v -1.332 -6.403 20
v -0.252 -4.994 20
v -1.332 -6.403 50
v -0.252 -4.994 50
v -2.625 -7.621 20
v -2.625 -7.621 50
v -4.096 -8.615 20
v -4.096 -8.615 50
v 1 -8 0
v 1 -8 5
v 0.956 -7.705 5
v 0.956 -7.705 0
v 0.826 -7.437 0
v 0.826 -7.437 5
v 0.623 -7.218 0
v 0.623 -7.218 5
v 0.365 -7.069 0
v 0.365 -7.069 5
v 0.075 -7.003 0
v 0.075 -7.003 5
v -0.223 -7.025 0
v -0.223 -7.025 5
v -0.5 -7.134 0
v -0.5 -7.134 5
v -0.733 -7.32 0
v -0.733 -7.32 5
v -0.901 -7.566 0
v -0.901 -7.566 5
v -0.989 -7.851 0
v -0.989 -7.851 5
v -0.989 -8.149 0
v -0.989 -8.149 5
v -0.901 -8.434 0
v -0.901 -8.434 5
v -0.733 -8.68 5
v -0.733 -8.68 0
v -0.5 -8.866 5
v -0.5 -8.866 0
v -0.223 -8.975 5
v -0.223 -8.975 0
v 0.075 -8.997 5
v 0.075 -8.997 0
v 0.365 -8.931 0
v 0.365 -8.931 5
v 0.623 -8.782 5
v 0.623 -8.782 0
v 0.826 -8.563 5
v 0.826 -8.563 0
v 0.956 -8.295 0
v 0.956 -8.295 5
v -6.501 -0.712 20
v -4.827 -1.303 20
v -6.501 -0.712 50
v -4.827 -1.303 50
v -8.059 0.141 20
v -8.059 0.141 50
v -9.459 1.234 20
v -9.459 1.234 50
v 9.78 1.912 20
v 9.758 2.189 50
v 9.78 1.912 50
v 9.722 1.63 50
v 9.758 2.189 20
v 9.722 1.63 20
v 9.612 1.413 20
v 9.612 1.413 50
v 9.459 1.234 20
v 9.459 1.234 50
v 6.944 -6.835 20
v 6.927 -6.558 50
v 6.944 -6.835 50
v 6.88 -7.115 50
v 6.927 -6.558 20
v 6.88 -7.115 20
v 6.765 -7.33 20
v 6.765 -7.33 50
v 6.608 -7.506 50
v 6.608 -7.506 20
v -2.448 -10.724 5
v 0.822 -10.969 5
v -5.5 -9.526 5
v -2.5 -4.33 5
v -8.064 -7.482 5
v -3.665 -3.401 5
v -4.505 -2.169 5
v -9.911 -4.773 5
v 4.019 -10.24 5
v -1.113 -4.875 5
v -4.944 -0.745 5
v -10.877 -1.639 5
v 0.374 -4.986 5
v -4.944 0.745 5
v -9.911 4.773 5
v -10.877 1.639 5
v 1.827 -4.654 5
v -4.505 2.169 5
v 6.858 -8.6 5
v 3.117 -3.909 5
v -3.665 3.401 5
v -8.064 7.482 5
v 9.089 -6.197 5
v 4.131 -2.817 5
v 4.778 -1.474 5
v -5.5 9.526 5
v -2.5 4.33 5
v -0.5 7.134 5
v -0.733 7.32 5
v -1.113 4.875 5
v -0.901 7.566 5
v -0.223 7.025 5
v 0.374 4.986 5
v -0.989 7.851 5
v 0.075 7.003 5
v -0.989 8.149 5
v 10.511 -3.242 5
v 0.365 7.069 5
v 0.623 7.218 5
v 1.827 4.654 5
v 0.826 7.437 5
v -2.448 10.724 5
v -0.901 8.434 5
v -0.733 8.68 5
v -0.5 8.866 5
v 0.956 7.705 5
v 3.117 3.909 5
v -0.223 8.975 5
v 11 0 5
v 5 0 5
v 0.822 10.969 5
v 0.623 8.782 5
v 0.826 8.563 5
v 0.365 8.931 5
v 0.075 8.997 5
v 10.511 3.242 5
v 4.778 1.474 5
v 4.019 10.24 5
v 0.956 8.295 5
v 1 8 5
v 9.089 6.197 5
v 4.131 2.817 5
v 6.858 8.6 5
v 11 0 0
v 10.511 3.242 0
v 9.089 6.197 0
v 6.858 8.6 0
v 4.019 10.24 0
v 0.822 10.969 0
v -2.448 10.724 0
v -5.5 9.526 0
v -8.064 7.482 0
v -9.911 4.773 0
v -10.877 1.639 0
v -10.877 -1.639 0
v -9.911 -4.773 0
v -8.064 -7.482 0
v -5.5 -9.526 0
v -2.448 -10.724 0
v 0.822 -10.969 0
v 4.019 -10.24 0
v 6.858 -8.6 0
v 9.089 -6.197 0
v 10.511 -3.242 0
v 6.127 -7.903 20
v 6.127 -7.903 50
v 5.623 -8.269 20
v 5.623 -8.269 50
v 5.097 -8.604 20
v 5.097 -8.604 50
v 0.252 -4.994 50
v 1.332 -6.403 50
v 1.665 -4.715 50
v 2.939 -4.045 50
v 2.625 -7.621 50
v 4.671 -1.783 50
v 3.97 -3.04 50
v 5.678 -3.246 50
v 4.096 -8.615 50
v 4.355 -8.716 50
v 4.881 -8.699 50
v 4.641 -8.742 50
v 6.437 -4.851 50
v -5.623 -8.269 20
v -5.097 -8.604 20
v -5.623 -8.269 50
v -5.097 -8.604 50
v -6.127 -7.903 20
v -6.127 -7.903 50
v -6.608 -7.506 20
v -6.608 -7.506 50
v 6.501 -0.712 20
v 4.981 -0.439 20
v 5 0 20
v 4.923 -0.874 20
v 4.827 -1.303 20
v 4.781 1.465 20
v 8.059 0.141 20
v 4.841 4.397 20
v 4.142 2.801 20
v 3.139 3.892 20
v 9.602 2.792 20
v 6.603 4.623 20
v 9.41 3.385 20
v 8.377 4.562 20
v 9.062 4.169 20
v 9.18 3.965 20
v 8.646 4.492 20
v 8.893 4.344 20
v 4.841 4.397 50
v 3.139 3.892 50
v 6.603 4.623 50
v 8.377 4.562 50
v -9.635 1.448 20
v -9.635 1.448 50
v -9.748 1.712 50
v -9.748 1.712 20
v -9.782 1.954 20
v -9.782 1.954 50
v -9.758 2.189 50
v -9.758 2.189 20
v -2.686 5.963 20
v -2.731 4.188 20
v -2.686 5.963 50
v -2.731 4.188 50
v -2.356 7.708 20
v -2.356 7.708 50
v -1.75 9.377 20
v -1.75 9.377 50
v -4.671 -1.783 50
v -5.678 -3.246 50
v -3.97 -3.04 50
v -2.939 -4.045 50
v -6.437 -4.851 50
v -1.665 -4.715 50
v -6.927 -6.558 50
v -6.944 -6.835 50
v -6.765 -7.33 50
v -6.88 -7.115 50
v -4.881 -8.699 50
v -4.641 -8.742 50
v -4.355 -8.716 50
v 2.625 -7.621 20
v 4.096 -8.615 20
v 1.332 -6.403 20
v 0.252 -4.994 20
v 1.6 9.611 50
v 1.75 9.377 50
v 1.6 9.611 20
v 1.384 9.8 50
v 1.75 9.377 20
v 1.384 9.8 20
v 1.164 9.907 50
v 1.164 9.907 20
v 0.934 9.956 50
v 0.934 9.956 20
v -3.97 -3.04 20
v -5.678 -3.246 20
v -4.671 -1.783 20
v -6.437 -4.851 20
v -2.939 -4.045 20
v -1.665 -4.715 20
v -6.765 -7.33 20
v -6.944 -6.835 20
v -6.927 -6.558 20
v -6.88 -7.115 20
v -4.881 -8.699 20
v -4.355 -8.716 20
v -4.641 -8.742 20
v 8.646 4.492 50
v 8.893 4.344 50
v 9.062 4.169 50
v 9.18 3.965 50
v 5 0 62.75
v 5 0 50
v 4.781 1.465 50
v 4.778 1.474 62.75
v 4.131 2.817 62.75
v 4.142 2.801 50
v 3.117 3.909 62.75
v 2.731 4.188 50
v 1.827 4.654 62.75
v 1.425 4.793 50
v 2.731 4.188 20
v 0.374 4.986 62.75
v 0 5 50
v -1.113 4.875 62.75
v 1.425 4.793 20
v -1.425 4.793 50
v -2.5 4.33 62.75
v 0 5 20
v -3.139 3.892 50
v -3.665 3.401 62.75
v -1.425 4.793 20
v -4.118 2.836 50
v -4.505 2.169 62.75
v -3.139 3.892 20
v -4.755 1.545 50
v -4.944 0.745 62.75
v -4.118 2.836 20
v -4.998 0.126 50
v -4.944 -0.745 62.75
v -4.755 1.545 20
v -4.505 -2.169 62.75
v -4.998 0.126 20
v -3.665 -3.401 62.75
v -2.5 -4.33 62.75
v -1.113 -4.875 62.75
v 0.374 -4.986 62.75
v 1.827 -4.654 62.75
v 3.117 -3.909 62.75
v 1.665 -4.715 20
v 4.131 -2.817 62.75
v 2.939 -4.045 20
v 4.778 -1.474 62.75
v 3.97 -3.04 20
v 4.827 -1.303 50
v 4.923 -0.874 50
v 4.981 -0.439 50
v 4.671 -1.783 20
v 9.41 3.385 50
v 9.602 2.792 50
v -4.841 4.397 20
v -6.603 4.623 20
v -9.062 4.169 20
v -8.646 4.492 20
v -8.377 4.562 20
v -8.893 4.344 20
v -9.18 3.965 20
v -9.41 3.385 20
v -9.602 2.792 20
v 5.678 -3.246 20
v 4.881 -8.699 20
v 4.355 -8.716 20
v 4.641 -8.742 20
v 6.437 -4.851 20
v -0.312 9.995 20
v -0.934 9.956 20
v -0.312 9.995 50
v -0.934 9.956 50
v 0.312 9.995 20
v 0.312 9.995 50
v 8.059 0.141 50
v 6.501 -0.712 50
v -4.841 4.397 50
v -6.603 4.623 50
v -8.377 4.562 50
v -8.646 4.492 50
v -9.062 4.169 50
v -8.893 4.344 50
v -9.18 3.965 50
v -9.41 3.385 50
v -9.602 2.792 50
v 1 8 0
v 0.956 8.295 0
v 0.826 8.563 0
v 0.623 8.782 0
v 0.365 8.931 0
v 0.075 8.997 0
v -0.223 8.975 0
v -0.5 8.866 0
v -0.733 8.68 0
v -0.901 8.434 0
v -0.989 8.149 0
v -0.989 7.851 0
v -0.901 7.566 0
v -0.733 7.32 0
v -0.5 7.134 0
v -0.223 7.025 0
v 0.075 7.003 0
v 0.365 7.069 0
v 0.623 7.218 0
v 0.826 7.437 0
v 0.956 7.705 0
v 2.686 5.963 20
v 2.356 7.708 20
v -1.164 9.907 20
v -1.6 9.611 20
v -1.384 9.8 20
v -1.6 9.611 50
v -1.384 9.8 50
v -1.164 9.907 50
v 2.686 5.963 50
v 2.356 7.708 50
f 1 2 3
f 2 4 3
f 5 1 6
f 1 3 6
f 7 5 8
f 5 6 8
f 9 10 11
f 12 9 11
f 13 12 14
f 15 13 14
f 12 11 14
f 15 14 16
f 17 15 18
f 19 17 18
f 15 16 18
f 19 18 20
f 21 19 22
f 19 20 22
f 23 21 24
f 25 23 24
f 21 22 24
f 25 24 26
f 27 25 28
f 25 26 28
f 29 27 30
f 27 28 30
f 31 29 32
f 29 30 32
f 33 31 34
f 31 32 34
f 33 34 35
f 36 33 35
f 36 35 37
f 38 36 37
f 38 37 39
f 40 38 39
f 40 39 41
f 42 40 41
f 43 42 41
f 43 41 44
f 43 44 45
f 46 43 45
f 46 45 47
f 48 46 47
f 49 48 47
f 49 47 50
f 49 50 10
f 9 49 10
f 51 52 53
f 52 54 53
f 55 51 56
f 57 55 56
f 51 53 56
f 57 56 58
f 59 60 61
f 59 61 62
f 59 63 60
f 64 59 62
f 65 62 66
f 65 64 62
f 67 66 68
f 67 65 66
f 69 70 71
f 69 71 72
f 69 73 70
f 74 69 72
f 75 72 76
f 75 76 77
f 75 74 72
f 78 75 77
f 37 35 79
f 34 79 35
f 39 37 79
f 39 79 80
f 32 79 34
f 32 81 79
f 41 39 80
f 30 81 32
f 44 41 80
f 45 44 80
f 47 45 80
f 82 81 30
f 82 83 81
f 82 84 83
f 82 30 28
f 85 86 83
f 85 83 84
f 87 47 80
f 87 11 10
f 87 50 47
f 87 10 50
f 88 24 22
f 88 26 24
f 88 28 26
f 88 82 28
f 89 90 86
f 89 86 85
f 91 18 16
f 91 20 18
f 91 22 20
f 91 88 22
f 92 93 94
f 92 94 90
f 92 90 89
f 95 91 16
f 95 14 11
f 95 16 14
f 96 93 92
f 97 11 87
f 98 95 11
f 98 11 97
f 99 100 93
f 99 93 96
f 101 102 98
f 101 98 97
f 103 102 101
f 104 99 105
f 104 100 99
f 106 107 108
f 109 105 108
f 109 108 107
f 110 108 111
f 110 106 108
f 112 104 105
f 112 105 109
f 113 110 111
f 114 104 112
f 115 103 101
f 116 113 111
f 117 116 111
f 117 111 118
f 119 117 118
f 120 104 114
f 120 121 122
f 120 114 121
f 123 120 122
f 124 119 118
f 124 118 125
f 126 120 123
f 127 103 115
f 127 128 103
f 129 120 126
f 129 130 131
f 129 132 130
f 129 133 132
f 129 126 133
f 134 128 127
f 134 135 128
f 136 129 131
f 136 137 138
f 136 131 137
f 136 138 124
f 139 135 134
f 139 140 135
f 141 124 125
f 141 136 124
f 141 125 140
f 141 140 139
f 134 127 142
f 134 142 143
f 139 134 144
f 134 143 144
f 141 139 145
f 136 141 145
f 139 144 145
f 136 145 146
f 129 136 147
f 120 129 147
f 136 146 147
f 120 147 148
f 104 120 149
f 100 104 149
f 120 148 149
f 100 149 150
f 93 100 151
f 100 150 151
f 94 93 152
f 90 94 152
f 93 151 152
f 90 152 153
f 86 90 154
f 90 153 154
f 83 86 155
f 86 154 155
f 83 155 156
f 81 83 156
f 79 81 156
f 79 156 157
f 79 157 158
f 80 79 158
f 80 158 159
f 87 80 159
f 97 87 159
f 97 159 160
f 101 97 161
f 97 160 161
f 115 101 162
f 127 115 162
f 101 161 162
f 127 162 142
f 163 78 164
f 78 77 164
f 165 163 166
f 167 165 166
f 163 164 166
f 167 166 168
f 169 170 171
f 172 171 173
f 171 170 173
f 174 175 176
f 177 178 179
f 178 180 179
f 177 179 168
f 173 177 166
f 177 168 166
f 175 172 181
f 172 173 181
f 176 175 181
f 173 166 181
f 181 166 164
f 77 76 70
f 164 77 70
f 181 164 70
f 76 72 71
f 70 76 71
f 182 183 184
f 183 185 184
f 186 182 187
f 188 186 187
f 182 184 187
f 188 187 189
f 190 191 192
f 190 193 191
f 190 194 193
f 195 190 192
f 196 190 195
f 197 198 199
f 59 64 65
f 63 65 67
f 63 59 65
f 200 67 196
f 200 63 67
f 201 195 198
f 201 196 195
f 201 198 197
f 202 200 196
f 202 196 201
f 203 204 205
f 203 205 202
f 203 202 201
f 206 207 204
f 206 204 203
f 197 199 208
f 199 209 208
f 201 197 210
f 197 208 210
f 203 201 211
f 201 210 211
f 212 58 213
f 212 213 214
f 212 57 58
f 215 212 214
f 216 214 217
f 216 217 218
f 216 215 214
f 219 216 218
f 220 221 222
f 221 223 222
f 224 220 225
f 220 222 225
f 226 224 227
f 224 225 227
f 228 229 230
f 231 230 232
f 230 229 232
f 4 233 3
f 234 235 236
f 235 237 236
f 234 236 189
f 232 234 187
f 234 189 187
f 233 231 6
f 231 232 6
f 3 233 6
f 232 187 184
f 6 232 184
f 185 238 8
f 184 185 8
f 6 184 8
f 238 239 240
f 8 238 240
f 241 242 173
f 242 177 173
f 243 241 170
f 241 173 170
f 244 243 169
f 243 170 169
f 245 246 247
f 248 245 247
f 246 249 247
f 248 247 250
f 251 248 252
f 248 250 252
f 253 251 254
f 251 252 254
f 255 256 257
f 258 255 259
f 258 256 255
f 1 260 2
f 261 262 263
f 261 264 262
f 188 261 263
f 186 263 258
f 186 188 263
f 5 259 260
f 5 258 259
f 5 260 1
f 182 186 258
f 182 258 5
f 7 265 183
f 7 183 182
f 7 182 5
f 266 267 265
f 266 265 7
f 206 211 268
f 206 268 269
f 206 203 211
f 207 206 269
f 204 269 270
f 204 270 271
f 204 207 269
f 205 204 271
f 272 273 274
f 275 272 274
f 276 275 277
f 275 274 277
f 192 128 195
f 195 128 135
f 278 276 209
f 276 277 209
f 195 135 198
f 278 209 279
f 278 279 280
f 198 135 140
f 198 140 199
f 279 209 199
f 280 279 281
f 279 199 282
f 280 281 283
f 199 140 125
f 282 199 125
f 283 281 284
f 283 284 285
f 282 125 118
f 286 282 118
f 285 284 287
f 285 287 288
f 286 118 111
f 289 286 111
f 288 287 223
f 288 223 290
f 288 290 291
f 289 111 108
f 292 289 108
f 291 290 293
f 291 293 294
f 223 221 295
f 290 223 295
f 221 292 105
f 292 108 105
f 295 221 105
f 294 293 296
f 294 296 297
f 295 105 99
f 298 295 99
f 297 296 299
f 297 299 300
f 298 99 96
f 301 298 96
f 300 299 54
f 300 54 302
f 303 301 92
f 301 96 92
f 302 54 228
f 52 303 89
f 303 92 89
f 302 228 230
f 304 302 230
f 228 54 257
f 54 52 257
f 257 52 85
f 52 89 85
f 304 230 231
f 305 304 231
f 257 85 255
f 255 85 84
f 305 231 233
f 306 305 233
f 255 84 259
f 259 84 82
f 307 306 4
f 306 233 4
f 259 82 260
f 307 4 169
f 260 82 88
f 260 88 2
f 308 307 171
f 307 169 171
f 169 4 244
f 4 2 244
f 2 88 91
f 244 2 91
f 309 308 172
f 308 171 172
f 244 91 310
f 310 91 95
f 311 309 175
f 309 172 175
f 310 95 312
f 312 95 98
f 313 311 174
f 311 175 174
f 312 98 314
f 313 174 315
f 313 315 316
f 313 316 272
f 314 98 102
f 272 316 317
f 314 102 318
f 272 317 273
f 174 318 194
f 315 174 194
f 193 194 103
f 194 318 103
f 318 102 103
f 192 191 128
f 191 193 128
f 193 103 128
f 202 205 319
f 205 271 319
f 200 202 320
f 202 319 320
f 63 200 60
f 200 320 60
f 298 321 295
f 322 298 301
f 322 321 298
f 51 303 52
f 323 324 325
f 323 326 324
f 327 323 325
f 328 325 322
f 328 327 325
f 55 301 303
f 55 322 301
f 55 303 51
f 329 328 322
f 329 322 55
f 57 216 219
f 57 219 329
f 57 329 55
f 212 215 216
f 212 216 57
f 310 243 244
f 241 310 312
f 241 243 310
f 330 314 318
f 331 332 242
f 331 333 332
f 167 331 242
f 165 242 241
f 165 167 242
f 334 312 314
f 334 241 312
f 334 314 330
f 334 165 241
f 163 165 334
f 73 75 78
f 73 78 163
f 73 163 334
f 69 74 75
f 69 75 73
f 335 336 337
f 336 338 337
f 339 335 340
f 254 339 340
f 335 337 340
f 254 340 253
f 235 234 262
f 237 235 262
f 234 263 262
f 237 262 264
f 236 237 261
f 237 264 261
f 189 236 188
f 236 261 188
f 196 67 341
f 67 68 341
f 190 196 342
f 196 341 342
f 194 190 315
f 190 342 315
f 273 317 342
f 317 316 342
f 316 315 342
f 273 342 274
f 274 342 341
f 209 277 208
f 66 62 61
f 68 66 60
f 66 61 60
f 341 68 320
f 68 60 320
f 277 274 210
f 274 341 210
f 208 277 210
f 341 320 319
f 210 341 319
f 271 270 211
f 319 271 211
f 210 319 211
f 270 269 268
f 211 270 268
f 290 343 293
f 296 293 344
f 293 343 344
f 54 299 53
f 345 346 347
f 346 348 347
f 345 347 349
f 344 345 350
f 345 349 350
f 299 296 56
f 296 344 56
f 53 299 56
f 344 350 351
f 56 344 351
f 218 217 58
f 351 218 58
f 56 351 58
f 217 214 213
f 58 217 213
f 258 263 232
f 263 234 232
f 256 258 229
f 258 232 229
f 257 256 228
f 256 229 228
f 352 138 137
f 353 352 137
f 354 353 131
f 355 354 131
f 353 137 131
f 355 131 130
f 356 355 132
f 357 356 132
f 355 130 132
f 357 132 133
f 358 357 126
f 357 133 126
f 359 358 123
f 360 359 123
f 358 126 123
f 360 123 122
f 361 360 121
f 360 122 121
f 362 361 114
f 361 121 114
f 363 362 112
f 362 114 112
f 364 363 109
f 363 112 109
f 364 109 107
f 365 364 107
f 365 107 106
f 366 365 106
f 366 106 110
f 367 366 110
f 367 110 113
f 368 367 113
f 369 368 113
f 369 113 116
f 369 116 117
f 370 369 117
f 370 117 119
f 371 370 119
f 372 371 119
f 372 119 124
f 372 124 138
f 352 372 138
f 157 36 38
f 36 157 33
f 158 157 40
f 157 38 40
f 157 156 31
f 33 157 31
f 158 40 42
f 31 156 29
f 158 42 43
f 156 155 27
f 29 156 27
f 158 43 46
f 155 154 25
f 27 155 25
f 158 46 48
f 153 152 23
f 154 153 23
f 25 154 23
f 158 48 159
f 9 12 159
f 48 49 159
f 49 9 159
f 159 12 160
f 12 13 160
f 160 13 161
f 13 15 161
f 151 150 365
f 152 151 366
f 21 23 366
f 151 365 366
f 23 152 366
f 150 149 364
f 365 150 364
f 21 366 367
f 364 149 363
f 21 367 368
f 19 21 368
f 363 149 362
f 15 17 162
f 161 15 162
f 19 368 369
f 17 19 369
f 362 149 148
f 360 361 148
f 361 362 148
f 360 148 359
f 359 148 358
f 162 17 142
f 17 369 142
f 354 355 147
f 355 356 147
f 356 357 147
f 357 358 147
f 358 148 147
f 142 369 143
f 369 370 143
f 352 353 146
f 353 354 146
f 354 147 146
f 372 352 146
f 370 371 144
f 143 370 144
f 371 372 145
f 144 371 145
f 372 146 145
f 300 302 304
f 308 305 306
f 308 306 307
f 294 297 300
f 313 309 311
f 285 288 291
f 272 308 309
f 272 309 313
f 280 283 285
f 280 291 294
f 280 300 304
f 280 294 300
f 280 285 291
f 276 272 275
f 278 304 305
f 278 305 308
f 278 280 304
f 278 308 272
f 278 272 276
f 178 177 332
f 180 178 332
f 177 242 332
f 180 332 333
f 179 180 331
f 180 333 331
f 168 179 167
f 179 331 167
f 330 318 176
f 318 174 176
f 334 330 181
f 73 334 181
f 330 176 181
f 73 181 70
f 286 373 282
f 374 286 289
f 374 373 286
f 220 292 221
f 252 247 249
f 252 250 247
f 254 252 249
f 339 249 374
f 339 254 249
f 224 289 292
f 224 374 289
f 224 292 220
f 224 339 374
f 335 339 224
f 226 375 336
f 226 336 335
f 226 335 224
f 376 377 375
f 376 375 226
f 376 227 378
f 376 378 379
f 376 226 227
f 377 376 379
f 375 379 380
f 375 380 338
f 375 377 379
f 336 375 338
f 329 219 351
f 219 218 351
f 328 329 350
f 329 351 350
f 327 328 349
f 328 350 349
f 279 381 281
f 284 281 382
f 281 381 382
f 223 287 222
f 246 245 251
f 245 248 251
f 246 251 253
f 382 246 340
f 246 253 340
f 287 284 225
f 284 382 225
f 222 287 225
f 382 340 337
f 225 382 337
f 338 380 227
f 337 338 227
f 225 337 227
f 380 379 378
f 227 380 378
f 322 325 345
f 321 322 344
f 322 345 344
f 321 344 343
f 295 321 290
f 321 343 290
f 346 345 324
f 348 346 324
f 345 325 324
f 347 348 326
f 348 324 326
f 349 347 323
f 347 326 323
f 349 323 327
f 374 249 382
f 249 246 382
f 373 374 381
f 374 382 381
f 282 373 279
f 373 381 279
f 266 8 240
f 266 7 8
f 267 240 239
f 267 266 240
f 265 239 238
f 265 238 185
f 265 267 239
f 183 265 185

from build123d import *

# Parameters (mm, degrees)
ESQUISSE1_R                        = 11
BOSS_EXTRU_1_DEPTH                 = 5
ESQUISSE2_R                        = 1
ENL_V_MAT_EXTRU_1_DEPTH            = 6
ESQUISSE3_R                        = 5
BOSS_EXTRU_2_DEPTH                 = 57.75
BOSS_EXTRU_3_DEPTH                 = 15
CONG_1_R                           = 1
R_P_TITION_CIRCULAIRE1_COUNT       = 5
CONG_1_OF_R_P_TITION_CIRCULAIRE1_R = 1


with BuildPart() as part:
    # Esquisse1 → Boss.-Extru.1 (new body)
    with BuildSketch(Plane.XY):
        Circle(ESQUISSE1_R)
    extrude(amount=BOSS_EXTRU_1_DEPTH)

    # Esquisse2 → Enlèv. mat.-Extru.1 (cut, through all)
    with BuildSketch(Plane.XY.offset(5)):
        with Locations((0, 8)):
            Circle(ESQUISSE2_R)
        with Locations((0, -8)):
            Circle(ESQUISSE2_R)
    extrude(amount=-ENL_V_MAT_EXTRU_1_DEPTH, mode=Mode.SUBTRACT)

    # Esquisse3 → Boss.-Extru.2 (add)
    with BuildSketch(Plane.XY.offset(5)):
        Circle(ESQUISSE3_R)
    extrude(amount=BOSS_EXTRU_2_DEPTH)

    # Esquisse4 → Boss.-Extru.3 (add, symmetric)
    with BuildSketch(Plane.XY.offset(35)):
        with BuildLine():
            ThreePointArc((-2.731158071, 4.188170912), (-2.5, 7.120566641), (-1.5, 9.886859967))
            ThreePointArc((-1.5, 9.886859967), (0, 10), (1.5, 9.886859967))
            ThreePointArc((1.5, 9.886859967), (2.5, 7.120566641), (2.731158071, 4.188170912))
            ThreePointArc((2.731158071, 4.188170912), (0, -5), (-2.731158071, 4.188170912))
        make_face()
    boss_extru_3 = extrude(amount=BOSS_EXTRU_3_DEPTH, both=True)

    # Congé1
    cong_1_edges = [part.edges().sort_by_distance(p)[0] for p in [
        (1.5, 9.886859967, 35),
        (-1.5, 9.886859967, 35),
    ]]
    fillet(cong_1_edges, radius=CONG_1_R)

    # Répétition circulaire1: Boss.-Extru.3 ×5 about axis
    r_p_tition_circulaire1_axis = Axis((0, 0, 0), (0, 0, 1))
    for i in range(1, R_P_TITION_CIRCULAIRE1_COUNT):
        add(boss_extru_3.rotate(r_p_tition_circulaire1_axis, i * 360 / R_P_TITION_CIRCULAIRE1_COUNT))

    # Congé1 of Répétition circulaire1
    cong_1_of_r_p_tition_circulaire1_edges = [part.edges().sort_by_distance(p)[0] for p in [
        (-8.939437105, 4.481792525, 35),
        (-9.866488089, 1.628622976, 35),
        (-7.024875971, -7.116959856, 35),
        (-4.597824988, -8.880315612, 35),
        (4.597824988, -8.880315612, 35),
        (7.024875971, -7.116959856, 35),
        (9.866488089, 1.628622976, 35),
        (8.939437105, 4.481792525, 35),
    ]]
    fillet(cong_1_of_r_p_tition_circulaire1_edges, radius=CONG_1_OF_R_P_TITION_CIRCULAIRE1_R)


solid = part.part
